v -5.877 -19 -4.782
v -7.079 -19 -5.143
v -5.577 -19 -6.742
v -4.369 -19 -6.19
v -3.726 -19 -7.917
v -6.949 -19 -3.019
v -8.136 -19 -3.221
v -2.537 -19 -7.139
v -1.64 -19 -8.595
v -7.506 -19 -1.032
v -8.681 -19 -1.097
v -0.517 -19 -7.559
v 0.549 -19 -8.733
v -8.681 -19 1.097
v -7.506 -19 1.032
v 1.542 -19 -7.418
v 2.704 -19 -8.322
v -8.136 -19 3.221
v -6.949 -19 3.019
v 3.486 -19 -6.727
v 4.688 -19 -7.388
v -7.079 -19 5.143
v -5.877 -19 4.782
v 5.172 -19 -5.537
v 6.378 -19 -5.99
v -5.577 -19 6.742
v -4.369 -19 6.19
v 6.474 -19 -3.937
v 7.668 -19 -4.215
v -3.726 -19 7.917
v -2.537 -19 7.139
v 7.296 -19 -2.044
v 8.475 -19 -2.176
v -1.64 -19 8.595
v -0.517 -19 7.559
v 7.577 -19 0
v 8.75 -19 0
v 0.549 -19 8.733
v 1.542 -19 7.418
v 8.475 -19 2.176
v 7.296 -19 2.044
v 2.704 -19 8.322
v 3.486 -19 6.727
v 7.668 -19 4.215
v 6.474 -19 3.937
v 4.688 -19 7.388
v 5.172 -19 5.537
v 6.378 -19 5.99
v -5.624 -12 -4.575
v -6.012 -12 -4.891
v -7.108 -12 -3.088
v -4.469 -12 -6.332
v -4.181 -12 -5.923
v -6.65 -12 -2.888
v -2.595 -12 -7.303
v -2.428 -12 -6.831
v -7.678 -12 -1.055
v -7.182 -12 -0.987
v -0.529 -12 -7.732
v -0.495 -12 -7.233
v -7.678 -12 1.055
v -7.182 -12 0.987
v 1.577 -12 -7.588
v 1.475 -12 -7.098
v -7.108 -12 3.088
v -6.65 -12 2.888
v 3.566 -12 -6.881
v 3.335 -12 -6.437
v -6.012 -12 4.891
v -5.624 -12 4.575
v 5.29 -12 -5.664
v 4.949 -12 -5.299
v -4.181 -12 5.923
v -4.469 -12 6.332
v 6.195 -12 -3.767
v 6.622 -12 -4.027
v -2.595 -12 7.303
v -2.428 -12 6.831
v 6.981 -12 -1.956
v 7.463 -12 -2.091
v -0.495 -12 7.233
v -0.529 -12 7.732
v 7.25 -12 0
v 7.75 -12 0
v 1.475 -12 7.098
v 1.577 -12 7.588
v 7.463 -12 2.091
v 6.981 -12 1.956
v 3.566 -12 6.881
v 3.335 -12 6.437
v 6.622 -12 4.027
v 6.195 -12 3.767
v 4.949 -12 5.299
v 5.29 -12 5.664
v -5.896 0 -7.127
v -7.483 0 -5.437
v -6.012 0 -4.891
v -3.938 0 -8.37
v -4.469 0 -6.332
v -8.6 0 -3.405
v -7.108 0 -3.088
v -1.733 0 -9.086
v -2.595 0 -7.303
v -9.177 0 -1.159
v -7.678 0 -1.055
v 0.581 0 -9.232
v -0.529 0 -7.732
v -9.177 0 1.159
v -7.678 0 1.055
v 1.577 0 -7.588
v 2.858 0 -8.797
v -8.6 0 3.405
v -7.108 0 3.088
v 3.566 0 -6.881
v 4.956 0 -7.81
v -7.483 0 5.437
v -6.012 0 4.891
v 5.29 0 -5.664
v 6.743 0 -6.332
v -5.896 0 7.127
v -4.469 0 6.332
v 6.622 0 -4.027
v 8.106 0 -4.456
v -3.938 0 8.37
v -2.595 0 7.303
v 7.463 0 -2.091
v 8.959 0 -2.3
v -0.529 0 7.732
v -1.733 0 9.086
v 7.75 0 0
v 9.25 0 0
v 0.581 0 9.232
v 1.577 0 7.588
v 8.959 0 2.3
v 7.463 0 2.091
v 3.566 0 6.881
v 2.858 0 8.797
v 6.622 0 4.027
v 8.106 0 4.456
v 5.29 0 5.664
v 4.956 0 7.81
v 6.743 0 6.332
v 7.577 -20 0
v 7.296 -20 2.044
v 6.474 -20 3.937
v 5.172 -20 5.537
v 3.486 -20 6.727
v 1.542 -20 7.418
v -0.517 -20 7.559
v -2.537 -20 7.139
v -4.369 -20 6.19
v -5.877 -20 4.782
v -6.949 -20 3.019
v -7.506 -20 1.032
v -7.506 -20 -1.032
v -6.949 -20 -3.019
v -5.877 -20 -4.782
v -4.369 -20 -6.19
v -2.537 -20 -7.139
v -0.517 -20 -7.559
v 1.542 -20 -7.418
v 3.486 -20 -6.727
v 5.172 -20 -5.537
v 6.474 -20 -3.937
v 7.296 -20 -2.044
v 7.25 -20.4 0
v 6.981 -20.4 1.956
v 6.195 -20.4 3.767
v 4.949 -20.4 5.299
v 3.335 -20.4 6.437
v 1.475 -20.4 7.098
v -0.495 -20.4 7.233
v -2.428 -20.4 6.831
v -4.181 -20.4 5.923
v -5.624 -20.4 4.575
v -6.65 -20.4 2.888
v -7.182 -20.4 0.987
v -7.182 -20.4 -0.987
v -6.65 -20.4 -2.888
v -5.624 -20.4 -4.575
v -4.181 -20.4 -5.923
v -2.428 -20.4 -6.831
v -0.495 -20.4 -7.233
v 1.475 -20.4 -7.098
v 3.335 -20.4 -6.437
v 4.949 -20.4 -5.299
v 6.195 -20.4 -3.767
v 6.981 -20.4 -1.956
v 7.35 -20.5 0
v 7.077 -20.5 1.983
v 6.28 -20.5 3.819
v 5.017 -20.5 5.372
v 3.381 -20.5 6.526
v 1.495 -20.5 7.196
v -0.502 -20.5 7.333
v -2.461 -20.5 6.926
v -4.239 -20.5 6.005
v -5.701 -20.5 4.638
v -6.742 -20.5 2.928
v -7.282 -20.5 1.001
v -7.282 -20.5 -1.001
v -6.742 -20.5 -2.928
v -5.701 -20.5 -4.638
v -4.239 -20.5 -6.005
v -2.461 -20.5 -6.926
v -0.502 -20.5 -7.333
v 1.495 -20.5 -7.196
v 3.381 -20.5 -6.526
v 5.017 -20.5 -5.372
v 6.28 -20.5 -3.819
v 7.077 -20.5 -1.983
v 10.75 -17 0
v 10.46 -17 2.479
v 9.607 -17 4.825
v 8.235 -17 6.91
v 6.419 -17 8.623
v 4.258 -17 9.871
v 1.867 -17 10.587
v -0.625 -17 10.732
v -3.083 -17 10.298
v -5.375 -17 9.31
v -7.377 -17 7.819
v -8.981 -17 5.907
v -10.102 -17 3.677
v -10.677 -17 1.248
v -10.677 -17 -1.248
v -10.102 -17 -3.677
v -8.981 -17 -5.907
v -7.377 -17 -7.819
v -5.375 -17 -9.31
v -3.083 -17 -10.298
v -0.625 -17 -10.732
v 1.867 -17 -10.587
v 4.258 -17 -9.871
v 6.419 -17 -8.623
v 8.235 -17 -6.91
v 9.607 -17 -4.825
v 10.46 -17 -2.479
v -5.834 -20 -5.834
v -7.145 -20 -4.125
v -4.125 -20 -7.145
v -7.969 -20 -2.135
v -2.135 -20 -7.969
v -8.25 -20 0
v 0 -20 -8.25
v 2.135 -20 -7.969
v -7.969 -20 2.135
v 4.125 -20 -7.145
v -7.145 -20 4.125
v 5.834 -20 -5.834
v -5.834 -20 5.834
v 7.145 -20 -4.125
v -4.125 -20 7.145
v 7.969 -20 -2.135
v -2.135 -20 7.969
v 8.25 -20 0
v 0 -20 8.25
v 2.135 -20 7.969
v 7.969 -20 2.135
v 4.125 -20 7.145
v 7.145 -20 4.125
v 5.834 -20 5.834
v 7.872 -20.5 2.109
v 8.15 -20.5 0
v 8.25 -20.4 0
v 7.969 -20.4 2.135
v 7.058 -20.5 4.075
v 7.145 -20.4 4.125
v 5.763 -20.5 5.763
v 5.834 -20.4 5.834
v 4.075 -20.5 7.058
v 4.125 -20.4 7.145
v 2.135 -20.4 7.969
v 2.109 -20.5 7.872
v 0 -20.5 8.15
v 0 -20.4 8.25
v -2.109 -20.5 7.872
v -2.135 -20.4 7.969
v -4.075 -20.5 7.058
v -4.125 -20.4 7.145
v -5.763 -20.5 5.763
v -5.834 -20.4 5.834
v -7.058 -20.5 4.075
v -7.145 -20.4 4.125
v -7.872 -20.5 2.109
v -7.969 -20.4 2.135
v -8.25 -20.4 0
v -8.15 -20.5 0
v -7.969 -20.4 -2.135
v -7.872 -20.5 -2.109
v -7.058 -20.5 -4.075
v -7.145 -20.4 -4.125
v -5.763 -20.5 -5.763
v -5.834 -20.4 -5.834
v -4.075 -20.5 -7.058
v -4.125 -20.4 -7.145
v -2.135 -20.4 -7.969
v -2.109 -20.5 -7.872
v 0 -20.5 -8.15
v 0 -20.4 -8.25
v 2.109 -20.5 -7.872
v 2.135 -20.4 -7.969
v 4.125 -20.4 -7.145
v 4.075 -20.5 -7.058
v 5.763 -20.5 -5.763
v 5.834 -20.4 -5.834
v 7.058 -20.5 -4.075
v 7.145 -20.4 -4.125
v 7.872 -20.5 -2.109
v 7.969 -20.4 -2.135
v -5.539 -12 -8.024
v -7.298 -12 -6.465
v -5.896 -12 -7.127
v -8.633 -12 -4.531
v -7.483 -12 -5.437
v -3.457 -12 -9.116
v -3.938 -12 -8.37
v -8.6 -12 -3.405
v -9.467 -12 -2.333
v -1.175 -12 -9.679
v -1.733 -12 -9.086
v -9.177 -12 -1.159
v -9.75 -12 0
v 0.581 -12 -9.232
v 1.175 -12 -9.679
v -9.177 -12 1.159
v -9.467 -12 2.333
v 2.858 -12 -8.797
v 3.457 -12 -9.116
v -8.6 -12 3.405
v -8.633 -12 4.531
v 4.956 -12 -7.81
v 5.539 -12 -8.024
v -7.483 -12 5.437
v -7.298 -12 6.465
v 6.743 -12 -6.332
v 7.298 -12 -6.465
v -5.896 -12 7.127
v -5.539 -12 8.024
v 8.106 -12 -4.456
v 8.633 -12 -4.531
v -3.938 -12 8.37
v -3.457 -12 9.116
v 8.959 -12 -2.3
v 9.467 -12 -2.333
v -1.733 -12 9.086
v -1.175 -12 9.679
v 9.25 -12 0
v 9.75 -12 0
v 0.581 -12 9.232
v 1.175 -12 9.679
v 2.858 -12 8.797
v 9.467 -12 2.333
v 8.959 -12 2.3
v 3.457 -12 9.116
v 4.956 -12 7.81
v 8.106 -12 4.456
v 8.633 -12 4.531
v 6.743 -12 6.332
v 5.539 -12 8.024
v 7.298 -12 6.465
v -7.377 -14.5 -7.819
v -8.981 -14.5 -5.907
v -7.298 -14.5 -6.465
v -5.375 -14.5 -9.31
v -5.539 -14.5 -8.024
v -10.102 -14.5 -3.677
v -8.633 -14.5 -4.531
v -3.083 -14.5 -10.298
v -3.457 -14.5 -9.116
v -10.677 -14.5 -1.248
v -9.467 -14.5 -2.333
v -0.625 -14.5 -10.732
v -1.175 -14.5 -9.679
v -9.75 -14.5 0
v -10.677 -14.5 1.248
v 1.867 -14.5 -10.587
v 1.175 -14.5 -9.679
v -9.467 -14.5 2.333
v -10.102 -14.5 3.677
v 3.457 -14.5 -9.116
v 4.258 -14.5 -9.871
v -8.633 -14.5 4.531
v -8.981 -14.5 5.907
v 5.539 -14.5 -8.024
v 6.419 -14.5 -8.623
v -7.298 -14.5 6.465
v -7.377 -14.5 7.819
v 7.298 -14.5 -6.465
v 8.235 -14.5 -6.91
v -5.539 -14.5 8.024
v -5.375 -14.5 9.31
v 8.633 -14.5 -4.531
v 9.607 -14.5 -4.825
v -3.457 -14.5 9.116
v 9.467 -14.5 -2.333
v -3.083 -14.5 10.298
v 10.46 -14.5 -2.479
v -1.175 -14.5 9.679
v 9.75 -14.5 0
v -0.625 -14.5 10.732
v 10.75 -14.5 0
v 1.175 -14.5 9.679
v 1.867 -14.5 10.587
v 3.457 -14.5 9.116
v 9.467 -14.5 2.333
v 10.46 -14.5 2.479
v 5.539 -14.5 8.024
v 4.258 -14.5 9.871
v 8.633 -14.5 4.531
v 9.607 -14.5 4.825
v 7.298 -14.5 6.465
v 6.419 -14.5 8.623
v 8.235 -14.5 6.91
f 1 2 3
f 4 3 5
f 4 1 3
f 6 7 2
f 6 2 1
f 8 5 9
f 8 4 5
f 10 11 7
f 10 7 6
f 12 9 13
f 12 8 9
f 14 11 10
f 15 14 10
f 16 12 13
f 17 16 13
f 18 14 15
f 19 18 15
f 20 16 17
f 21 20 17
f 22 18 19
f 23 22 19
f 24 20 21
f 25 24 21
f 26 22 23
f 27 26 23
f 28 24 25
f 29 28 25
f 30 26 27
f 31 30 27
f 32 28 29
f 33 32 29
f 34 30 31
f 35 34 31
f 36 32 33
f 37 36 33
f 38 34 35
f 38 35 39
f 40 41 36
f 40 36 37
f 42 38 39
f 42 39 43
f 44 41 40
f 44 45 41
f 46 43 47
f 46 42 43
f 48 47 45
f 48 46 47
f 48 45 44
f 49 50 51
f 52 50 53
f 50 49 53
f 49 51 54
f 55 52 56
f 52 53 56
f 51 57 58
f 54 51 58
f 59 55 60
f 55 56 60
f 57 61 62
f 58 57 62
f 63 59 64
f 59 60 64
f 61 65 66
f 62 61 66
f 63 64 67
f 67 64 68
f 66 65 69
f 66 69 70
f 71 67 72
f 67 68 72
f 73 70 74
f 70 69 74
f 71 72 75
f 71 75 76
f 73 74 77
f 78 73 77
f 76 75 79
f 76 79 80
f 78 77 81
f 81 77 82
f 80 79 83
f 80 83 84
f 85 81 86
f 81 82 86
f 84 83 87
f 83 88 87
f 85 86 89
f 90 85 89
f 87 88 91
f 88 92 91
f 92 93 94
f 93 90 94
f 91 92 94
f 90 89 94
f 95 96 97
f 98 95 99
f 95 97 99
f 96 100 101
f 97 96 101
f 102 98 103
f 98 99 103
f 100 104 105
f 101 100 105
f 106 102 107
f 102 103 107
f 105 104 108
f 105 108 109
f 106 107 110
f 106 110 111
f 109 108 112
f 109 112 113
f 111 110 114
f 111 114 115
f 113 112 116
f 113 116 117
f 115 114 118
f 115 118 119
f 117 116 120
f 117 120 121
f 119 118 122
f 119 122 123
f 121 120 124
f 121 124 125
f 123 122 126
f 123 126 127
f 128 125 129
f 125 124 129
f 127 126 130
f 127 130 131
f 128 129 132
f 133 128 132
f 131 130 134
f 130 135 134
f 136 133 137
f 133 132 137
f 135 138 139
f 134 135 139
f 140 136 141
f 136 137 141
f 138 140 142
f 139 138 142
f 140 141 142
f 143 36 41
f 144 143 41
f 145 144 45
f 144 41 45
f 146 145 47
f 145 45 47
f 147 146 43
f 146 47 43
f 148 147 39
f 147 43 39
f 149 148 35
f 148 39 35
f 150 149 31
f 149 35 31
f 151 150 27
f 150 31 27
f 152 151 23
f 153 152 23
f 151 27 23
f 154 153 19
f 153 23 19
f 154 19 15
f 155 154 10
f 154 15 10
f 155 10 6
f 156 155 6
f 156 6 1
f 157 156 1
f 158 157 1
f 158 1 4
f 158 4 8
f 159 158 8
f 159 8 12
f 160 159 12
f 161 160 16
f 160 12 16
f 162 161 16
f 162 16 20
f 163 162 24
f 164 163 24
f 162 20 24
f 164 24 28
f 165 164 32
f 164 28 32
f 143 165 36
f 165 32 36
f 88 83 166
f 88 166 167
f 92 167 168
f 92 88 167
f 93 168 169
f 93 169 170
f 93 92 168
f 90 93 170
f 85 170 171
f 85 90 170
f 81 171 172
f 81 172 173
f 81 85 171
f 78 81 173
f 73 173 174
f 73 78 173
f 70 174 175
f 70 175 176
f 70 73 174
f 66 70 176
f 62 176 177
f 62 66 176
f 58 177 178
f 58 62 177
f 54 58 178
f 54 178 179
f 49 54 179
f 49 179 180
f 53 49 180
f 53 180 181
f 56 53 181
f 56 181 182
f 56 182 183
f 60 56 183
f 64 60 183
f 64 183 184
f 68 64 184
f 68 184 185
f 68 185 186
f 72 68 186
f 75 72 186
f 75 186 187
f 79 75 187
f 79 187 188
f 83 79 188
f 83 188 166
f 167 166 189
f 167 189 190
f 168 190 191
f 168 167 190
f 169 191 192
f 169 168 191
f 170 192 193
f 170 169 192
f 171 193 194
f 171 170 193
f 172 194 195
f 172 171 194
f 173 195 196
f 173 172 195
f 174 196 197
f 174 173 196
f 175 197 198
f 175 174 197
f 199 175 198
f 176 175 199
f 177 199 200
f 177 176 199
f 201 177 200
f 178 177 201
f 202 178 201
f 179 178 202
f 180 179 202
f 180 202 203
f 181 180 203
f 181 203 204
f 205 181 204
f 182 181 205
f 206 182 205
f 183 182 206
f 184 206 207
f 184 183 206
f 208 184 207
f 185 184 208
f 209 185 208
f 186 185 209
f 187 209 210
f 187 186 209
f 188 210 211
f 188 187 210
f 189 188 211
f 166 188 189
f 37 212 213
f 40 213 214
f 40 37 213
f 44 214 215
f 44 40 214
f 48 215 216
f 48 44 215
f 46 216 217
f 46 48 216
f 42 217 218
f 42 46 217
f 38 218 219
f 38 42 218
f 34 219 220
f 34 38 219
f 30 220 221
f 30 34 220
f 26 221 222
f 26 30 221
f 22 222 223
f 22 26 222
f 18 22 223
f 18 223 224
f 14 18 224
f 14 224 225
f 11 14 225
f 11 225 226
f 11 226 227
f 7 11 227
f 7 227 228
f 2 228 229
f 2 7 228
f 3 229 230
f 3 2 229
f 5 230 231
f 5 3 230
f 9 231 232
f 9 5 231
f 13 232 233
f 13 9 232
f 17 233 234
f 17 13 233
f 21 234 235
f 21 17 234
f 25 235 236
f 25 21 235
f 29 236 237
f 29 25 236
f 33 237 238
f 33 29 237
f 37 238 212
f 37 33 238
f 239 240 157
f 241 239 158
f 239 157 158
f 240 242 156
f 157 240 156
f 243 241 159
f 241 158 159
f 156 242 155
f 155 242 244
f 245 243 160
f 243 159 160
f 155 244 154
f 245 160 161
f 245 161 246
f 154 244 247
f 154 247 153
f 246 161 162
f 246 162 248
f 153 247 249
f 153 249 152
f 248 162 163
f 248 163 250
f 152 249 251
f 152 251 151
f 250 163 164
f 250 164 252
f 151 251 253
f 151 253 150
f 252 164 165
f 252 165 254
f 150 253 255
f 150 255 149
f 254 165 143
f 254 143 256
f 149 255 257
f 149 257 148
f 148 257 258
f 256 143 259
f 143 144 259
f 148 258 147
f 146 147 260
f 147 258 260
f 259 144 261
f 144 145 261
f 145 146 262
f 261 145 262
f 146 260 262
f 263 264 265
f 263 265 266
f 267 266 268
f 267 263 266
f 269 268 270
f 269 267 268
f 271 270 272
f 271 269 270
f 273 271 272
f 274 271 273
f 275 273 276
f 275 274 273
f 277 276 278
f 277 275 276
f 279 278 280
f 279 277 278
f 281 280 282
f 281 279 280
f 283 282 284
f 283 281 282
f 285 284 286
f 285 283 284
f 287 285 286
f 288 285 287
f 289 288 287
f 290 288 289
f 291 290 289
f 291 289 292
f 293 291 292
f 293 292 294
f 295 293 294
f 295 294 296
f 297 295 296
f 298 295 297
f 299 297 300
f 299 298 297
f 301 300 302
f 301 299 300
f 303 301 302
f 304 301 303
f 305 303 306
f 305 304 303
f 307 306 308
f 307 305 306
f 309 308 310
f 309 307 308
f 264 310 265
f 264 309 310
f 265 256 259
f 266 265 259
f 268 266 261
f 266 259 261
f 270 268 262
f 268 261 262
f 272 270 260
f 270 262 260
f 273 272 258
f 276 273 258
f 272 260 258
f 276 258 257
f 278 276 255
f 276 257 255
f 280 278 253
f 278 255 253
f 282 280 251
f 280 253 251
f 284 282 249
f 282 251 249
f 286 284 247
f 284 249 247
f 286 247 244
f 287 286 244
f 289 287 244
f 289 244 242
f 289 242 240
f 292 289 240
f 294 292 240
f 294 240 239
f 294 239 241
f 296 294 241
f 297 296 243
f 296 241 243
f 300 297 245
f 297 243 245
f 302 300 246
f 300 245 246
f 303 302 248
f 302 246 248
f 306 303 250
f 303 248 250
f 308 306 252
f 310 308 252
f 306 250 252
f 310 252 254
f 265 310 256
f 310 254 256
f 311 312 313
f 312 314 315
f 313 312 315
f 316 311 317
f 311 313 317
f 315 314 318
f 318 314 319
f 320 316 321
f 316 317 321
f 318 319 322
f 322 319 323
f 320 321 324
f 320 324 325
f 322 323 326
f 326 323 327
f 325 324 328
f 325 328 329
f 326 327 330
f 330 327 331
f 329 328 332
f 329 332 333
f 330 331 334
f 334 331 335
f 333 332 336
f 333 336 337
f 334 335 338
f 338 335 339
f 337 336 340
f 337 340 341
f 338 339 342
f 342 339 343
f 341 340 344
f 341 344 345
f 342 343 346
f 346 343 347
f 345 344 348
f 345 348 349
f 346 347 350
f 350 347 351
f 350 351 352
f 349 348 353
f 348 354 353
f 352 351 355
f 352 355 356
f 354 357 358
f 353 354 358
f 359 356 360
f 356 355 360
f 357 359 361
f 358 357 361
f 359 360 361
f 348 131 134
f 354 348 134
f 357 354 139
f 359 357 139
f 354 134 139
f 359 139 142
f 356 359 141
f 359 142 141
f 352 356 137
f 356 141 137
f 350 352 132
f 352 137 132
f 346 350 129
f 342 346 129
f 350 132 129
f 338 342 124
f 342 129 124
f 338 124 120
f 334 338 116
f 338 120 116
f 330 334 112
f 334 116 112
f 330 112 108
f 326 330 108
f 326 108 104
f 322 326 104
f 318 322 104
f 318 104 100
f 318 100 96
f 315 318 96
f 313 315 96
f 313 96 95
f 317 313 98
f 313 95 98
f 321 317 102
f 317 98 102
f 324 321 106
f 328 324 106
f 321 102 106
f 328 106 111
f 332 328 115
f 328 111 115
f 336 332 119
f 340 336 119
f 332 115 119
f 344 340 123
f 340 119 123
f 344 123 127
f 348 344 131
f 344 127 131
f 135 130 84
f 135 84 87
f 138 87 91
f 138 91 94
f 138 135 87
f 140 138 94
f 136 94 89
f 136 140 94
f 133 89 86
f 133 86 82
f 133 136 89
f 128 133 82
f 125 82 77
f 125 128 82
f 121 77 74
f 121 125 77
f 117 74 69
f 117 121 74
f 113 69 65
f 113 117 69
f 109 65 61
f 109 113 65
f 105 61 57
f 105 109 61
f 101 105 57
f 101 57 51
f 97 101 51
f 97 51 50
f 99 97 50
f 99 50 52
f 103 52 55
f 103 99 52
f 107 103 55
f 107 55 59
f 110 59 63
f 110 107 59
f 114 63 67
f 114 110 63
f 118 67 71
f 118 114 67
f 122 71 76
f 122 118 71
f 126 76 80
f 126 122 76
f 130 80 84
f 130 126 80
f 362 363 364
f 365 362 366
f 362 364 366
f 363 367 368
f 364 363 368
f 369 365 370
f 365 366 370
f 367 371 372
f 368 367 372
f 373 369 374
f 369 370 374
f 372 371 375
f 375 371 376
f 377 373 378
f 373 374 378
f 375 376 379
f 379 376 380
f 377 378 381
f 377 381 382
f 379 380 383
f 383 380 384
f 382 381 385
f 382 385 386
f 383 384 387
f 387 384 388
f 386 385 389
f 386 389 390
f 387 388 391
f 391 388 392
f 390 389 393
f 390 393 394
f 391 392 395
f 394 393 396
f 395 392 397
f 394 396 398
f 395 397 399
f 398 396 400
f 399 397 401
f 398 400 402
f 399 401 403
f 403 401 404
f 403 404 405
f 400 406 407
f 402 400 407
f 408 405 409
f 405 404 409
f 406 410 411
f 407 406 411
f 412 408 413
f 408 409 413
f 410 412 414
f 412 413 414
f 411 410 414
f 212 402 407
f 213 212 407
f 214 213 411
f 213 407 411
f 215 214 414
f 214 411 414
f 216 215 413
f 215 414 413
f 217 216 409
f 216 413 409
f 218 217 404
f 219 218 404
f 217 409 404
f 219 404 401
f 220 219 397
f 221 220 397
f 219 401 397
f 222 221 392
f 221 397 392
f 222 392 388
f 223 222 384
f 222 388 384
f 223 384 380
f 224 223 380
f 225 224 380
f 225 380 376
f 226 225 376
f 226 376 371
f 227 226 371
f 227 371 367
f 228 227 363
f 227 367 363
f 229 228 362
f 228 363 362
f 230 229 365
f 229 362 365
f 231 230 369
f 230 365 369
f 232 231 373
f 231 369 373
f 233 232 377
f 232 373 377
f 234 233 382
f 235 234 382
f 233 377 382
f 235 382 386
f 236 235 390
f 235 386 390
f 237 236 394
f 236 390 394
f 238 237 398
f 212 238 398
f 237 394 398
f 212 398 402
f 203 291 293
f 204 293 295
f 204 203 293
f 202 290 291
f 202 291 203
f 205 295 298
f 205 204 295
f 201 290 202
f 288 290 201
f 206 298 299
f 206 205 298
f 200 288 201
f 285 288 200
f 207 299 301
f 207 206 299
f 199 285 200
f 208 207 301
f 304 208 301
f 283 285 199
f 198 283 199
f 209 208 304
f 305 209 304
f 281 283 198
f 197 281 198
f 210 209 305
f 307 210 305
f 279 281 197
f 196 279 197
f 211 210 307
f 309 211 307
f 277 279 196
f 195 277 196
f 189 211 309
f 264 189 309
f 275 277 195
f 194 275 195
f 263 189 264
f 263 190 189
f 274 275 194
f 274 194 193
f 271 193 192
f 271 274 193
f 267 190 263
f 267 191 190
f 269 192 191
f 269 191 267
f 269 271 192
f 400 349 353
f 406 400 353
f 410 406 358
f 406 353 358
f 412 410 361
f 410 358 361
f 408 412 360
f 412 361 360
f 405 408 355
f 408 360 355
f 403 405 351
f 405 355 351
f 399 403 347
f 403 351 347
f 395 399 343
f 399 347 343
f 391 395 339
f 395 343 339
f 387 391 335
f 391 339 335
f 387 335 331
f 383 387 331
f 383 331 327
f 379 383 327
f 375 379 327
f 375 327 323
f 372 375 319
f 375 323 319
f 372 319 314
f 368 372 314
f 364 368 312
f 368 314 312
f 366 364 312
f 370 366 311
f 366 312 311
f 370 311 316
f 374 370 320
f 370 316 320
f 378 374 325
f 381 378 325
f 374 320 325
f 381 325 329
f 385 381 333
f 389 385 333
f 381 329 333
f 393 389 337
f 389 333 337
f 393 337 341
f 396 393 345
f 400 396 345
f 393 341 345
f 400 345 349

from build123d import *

# Parameters (mm, degrees)
F0_R      = 9.25
F0_R_2    = 7.75
F1_DEPTH  = 12
F2_R      = 9.75
F2_R_2    = 7.25
F3_DEPTH  = 2.5
F4_R      = 10.75
F4_R_2    = 7.25
F5_DEPTH  = 4.5
F6_SIZE   = 2
F7_R      = 7.5767654437
F7_R_2    = 7.25
F8_DEPTH  = 1
F9_R      = 8.25
F9_R_2    = 7.5767654437
F9_R_3    = 7.25
F10_DEPTH = 0.5
F11_SIZE  = 0.1


with BuildPart() as f1:
    # F0 (on Front) → F1 (new body)
    with BuildSketch(Plane.XZ):
        Circle(F0_R)
        Circle(F0_R_2, mode=Mode.SUBTRACT)
    extrude(amount=F1_DEPTH)

    # F2 (on face) → F3 (join)
    with BuildSketch(Plane.XZ.offset(12)):
        Circle(F2_R)
        Circle(F2_R_2, mode=Mode.SUBTRACT)
    extrude(amount=F3_DEPTH)

    # F4 (on face) → F5 (join)
    with BuildSketch(Plane.XZ.offset(14.5)):
        Circle(F4_R)
        Circle(F4_R_2, mode=Mode.SUBTRACT)
    extrude(amount=F5_DEPTH)

    # F6
    f6_edges = [f1.edges().sort_by_distance(p)[0] for p in [
        (-10.75, -19, 0),
    ]]
    chamfer(f6_edges, length=F6_SIZE)

    # F7 (on face) → F8 (join)
    with BuildSketch(Plane.XZ.offset(19)):
        Circle(F7_R)
        Circle(F7_R_2, mode=Mode.SUBTRACT)
    extrude(amount=F8_DEPTH)

    # F9 (on face) → F10 (join)
    with BuildSketch(Plane.XZ.offset(20)):
        Circle(F9_R)
        Circle(F9_R_2, mode=Mode.SUBTRACT)
        Circle(F9_R_2)
        Circle(F9_R_3, mode=Mode.SUBTRACT)
    extrude(amount=F10_DEPTH)

    # F11
    f11_edges = [f1.edges().sort_by_distance(p)[0] for p in [
        (-7.25, -20.5, 0),
        (-8.25, -20.5, 0),
    ]]
    chamfer(f11_edges, length=F11_SIZE)


solid = f1.part
